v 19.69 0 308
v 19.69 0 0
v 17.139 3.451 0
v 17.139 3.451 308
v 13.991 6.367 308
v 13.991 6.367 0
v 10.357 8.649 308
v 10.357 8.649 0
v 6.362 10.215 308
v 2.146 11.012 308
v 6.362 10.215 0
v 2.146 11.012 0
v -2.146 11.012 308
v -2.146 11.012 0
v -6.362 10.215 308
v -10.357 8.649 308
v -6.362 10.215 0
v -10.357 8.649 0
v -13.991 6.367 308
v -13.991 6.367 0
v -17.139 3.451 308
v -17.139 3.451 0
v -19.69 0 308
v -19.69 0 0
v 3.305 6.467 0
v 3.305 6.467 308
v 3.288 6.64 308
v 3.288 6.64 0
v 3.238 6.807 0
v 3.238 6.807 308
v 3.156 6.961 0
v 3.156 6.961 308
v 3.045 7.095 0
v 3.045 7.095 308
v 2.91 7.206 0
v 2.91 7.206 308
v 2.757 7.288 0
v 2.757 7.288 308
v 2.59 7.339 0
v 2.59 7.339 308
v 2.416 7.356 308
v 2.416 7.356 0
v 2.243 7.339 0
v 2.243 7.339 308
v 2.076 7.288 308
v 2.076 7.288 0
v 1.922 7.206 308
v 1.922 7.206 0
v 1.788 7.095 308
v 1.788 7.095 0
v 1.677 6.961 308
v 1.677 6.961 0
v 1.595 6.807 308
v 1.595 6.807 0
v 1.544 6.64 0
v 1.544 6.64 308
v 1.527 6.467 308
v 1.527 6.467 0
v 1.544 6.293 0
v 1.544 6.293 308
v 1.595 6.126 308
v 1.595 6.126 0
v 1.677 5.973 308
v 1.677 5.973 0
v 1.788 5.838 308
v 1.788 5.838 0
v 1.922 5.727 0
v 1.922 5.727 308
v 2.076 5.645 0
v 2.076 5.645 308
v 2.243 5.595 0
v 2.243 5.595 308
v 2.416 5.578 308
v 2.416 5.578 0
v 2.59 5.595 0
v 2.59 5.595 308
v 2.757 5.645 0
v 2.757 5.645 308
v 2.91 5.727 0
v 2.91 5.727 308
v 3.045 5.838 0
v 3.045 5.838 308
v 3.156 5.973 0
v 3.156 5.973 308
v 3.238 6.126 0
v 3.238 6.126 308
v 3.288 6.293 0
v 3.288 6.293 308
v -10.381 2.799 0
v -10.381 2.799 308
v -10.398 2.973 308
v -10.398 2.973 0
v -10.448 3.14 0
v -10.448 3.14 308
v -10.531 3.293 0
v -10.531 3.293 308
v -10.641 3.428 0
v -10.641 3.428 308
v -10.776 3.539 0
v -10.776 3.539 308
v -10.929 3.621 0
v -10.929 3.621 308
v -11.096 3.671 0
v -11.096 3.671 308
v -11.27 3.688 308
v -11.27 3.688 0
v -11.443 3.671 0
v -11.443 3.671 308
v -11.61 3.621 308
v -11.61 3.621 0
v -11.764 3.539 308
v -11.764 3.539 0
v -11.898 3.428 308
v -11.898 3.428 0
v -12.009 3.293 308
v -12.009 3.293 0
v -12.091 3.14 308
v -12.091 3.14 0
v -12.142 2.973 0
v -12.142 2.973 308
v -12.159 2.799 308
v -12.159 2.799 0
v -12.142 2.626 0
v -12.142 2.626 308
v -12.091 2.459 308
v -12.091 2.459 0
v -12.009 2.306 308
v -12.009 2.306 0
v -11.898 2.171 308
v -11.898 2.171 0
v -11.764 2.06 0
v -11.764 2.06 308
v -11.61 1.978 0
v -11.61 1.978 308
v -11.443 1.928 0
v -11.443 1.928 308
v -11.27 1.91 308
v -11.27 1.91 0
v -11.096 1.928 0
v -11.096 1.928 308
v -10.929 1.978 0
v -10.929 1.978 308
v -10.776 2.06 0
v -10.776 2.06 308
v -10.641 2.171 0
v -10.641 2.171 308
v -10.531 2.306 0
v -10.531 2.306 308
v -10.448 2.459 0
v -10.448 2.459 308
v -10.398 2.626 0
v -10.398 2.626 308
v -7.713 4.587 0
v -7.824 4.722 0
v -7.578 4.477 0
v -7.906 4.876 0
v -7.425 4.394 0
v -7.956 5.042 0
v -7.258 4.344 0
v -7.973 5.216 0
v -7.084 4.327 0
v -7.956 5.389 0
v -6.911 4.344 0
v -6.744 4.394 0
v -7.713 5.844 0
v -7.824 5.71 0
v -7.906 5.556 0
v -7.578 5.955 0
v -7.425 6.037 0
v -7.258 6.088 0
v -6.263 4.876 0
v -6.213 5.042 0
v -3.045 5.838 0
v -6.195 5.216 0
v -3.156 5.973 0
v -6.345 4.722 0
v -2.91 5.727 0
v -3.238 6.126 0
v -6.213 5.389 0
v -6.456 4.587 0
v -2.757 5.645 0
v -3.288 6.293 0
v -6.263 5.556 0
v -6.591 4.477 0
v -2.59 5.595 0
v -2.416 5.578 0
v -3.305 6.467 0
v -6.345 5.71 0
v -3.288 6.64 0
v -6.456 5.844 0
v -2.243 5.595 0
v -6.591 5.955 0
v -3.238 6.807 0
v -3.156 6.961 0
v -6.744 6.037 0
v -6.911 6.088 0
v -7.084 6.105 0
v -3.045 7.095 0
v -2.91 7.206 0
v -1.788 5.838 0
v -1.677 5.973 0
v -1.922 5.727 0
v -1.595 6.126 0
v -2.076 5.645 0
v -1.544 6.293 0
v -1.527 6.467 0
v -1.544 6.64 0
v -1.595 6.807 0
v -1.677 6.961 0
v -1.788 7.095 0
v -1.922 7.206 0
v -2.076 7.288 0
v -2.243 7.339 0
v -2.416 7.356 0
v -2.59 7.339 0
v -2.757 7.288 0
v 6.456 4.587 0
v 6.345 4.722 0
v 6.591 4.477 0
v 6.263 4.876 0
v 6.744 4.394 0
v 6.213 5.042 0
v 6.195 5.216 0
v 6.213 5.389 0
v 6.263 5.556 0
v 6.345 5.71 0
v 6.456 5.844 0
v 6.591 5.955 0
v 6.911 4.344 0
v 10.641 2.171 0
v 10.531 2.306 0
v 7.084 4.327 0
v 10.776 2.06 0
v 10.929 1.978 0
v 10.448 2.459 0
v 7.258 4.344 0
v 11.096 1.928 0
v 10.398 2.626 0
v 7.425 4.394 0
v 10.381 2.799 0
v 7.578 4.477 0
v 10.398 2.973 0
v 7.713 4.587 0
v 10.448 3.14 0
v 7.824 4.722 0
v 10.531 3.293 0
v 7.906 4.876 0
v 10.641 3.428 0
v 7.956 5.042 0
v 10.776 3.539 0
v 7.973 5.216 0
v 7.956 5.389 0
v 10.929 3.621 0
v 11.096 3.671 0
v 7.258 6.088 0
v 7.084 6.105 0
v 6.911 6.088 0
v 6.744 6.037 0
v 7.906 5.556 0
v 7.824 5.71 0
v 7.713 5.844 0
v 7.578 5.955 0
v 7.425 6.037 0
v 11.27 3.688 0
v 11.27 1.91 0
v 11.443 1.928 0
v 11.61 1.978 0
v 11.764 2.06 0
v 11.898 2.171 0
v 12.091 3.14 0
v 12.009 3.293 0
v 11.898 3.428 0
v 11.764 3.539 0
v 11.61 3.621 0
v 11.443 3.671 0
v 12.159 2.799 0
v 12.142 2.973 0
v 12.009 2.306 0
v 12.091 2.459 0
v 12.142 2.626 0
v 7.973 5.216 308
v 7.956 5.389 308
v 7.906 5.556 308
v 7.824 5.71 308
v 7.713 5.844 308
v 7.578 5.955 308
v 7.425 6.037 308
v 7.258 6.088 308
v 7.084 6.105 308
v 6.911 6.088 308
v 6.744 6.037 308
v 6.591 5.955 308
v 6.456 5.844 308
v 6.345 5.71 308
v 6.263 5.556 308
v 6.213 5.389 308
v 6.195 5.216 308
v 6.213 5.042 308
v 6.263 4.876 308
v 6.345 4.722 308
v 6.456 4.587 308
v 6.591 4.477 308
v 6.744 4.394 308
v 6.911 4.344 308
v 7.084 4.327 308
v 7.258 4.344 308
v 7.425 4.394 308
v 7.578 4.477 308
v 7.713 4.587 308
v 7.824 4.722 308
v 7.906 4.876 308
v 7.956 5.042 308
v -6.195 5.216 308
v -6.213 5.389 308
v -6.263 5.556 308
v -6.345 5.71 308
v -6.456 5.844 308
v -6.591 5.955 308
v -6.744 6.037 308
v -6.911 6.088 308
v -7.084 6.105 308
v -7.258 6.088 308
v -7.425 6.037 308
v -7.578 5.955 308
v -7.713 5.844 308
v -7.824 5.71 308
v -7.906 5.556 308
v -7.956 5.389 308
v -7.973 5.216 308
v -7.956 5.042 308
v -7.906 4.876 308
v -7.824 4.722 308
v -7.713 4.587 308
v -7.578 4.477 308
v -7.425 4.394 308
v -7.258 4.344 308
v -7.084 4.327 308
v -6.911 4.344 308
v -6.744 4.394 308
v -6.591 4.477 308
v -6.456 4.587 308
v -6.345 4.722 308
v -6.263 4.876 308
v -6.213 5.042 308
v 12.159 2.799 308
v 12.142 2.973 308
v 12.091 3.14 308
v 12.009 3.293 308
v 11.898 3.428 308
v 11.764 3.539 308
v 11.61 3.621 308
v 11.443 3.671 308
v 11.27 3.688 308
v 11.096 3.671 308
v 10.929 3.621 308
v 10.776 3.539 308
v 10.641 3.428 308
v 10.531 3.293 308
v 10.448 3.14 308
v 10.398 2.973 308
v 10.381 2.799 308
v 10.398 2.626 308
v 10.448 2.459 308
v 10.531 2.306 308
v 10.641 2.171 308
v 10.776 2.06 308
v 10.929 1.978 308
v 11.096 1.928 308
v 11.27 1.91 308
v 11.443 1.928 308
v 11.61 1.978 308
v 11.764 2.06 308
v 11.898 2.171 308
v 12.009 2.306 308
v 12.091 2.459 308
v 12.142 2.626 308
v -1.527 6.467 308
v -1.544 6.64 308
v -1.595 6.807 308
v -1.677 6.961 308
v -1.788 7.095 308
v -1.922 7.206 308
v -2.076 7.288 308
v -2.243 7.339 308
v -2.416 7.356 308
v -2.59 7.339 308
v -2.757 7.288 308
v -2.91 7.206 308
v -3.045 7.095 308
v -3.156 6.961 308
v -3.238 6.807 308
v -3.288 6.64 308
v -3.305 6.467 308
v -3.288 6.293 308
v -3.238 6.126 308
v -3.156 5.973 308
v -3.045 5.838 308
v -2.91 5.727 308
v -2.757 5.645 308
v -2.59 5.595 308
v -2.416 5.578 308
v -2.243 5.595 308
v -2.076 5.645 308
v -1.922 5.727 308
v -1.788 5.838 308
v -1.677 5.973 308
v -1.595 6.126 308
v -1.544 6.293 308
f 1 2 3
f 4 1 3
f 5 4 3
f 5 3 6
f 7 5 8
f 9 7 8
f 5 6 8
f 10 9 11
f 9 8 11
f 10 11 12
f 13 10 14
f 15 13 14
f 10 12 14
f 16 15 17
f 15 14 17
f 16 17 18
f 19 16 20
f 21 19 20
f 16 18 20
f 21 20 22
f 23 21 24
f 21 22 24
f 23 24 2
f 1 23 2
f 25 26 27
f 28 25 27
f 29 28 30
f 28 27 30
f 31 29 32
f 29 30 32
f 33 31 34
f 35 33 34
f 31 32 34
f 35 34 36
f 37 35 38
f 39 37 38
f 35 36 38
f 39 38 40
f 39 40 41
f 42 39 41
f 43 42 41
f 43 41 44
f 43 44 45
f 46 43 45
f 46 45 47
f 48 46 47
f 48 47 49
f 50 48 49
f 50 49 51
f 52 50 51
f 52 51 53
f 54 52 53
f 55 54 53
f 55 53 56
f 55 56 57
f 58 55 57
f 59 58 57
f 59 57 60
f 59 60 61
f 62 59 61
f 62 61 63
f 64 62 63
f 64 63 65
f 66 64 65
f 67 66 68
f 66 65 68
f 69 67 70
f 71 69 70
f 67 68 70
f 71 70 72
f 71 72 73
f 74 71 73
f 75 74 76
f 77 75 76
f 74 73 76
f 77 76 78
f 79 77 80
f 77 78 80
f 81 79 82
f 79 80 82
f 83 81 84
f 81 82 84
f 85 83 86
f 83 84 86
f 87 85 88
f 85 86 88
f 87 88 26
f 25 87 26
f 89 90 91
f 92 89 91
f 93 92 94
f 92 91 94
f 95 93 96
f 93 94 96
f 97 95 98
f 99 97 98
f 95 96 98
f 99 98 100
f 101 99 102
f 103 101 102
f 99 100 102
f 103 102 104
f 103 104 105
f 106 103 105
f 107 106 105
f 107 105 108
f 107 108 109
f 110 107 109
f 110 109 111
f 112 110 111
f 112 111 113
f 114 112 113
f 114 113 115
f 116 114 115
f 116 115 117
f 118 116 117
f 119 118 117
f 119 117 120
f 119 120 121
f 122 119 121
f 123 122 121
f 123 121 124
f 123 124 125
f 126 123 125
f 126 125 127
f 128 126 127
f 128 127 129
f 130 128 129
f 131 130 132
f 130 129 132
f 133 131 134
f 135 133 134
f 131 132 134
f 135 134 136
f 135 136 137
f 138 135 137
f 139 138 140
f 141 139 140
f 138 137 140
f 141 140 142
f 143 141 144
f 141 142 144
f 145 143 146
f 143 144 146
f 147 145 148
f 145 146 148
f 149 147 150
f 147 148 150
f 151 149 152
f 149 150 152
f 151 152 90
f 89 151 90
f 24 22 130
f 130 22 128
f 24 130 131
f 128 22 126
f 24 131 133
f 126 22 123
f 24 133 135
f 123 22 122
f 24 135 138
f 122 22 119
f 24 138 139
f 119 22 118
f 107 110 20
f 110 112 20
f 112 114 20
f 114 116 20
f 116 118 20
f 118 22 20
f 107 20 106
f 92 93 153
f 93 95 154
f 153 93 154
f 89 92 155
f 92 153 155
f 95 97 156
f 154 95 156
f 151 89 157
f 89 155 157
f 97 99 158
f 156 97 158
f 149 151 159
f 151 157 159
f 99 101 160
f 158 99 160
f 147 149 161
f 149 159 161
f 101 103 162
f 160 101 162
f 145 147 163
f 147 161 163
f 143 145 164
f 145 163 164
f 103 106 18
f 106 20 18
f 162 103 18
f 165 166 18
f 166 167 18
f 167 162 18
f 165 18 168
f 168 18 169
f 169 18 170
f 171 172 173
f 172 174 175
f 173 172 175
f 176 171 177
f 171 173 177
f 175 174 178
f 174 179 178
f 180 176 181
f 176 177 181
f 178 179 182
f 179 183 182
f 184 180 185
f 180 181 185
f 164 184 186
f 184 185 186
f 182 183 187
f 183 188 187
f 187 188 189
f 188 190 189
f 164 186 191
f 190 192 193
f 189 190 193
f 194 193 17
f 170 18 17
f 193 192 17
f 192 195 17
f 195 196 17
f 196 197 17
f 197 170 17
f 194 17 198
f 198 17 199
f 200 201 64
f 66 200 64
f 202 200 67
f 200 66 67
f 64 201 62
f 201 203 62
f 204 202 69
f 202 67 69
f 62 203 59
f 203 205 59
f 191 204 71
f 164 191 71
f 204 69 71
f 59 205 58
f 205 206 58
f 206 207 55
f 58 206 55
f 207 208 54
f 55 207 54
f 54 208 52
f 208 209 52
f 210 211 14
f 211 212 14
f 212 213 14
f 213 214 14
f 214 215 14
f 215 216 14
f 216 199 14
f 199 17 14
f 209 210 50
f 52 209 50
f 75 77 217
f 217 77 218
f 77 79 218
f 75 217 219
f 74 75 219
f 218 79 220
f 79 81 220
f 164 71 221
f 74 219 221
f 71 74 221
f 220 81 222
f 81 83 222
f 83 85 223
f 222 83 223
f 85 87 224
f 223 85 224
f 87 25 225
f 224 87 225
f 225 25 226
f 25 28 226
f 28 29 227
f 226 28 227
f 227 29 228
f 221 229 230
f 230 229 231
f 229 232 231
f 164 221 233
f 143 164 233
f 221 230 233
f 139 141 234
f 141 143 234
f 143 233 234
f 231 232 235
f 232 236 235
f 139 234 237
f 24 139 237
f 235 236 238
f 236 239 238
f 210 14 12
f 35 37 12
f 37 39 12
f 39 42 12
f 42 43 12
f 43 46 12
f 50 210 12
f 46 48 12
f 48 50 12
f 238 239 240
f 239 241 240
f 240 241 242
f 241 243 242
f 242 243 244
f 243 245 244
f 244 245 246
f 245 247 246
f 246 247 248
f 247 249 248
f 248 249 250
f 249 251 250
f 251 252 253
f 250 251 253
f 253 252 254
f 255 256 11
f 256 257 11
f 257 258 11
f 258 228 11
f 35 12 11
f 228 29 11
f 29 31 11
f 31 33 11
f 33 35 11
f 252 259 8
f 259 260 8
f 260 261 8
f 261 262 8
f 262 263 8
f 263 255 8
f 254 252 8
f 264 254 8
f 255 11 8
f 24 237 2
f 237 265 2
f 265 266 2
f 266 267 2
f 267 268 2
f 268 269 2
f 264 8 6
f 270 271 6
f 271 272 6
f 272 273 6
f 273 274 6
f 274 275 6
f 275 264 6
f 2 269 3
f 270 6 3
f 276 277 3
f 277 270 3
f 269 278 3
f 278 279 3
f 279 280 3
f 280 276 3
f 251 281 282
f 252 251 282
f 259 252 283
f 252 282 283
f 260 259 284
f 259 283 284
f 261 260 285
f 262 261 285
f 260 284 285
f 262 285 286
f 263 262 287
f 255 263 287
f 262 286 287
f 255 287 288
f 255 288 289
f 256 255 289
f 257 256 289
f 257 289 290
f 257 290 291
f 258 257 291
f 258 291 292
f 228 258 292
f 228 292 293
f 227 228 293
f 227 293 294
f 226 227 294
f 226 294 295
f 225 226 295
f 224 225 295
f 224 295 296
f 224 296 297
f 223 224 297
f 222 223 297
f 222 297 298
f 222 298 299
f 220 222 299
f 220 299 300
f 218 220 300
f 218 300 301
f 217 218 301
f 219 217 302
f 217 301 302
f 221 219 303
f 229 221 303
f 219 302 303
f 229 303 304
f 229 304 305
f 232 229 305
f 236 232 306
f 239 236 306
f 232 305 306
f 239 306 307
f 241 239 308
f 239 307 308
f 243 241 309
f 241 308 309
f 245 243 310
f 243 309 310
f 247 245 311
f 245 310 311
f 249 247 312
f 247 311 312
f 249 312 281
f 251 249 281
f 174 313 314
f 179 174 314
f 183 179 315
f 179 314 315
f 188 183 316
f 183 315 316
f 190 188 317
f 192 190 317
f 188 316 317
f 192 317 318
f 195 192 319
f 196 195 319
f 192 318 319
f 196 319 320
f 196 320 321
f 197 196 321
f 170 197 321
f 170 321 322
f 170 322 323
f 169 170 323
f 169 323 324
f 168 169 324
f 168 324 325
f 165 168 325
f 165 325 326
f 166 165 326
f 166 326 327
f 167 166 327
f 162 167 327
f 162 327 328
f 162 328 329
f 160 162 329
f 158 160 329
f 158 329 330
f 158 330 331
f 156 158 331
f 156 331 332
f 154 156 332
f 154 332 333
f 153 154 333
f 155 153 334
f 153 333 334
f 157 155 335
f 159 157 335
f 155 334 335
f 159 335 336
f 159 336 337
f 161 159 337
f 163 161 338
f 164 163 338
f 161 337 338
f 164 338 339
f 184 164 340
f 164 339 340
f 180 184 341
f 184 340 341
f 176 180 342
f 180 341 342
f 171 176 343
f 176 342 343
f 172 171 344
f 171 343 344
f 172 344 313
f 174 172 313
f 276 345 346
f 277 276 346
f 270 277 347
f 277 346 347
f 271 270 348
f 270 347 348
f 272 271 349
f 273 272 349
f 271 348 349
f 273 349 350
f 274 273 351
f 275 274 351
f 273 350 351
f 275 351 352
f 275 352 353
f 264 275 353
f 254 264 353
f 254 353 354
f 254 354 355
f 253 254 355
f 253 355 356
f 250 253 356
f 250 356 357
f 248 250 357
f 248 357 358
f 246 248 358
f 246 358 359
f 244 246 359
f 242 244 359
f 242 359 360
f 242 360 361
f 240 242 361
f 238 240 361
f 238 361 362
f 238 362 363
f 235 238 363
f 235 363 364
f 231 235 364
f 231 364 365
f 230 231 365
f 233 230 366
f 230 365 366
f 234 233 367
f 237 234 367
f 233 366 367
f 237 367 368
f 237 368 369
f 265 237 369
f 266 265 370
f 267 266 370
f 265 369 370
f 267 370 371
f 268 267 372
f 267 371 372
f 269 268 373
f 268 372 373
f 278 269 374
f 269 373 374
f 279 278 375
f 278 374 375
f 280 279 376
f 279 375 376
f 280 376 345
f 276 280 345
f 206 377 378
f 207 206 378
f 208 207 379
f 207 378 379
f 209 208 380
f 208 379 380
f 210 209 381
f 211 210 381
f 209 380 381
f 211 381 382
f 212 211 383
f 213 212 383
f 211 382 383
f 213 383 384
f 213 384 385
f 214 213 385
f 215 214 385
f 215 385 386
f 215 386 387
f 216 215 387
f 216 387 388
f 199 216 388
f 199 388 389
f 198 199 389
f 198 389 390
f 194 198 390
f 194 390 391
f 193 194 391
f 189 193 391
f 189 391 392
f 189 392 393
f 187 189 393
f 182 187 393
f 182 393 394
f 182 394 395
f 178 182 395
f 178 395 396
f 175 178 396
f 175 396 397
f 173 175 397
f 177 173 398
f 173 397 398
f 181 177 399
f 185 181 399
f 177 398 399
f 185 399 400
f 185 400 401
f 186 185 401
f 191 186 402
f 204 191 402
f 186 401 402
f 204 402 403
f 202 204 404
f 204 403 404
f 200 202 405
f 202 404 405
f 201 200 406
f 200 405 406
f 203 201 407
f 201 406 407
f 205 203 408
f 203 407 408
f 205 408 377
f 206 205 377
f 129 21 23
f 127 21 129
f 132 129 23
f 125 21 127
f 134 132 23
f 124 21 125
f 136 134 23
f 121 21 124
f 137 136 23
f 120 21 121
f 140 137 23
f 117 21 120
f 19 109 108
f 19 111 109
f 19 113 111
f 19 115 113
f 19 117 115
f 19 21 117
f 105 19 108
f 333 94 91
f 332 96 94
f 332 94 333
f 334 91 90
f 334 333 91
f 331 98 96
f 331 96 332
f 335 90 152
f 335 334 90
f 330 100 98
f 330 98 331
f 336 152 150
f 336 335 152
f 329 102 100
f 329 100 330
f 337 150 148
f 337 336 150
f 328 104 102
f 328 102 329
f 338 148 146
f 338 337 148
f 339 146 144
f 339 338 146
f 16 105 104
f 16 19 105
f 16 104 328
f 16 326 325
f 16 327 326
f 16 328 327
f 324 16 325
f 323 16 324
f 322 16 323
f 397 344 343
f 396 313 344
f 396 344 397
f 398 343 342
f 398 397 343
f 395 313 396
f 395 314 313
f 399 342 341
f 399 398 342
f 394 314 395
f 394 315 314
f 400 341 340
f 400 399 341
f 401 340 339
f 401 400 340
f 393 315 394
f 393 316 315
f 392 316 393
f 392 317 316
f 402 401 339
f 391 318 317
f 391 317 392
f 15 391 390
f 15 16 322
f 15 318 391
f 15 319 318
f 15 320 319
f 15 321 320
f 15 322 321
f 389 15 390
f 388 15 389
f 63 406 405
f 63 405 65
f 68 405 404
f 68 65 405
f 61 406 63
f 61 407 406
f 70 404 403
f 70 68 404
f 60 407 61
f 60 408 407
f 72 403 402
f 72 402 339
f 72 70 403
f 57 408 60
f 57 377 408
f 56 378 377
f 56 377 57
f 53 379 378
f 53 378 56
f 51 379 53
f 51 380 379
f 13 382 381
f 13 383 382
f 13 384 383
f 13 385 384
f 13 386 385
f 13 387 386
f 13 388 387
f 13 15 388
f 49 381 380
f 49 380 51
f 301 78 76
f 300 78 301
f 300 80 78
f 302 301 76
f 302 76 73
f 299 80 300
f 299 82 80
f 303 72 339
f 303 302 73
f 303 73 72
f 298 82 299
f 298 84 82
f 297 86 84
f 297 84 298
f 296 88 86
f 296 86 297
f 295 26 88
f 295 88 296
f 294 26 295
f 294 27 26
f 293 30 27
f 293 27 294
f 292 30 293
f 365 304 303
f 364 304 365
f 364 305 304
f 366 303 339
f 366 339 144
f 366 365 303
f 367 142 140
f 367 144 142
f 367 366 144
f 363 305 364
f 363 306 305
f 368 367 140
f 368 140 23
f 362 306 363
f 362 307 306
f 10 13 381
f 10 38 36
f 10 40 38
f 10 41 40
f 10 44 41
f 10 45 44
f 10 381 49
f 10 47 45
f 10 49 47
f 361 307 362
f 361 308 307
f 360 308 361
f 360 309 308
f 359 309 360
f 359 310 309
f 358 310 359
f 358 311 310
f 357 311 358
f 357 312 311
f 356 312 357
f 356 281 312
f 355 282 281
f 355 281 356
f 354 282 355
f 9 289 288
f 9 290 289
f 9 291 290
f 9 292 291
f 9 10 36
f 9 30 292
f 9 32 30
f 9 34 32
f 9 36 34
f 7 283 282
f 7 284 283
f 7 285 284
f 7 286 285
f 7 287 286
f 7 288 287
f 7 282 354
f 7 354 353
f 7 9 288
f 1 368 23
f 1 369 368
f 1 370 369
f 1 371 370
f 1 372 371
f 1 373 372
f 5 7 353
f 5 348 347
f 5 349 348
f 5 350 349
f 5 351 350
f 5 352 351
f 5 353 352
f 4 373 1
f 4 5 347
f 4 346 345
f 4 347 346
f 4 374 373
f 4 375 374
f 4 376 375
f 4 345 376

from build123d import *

# Parameters (mm, degrees)
BOSS_EXTRUDE1_DEPTH = 308.00000001
CUT_EXTRUDE1_REACH  = 310.829
SKETCH2_R           = 0.889


with BuildPart() as part:
    # Sketch1 → Boss-Extrude1 (new body)
    with BuildSketch(Plane.XY):
        with BuildLine():
            Line((-19.689777646, 0), (19.689777646, 0))
            ThreePointArc((19.689777646, 0), (0, 11.1125), (-19.689777646, 0))
        make_face()
    extrude(amount=BOSS_EXTRUDE1_DEPTH)

    # Sketch2 → Cut-Extrude1 (cut, up to next)
    with BuildSketch(Plane.XY.offset(308.00000001), mode=Mode.PRIVATE) as cut_extrude1_sk1:
        with Locations((-11.269696042, 2.799461)):
            Circle(SKETCH2_R)
    cut_extrude1_tool1 = extrude(cut_extrude1_sk1.sketch, amount=-CUT_EXTRUDE1_REACH, mode=Mode.PRIVATE) & part.part
    # Sketch2 → Cut-Extrude1 (cut, up to next)
    with BuildSketch(Plane.XY.offset(308.00000001), mode=Mode.PRIVATE) as cut_extrude1_sk2:
        with Locations((-7.084427042, 5.2158138)):
            Circle(SKETCH2_R)
    cut_extrude1_tool2 = extrude(cut_extrude1_sk2.sketch, amount=-CUT_EXTRUDE1_REACH, mode=Mode.PRIVATE) & part.part
    # Sketch2 → Cut-Extrude1 (cut, up to next)
    with BuildSketch(Plane.XY.offset(308.00000001), mode=Mode.PRIVATE) as cut_extrude1_sk3:
        with Locations((-2.416366133, 6.4666114)):
            Circle(SKETCH2_R)
    cut_extrude1_tool3 = extrude(cut_extrude1_sk3.sketch, amount=-CUT_EXTRUDE1_REACH, mode=Mode.PRIVATE) & part.part
    # Sketch2 → Cut-Extrude1 (cut, up to next)
    with BuildSketch(Plane.XY.offset(308.00000001), mode=Mode.PRIVATE) as cut_extrude1_sk4:
        with Locations((2.416366133, 6.4666114)):
            Circle(SKETCH2_R)
    cut_extrude1_tool4 = extrude(cut_extrude1_sk4.sketch, amount=-CUT_EXTRUDE1_REACH, mode=Mode.PRIVATE) & part.part
    # Sketch2 → Cut-Extrude1 (cut, up to next)
    with BuildSketch(Plane.XY.offset(308.00000001), mode=Mode.PRIVATE) as cut_extrude1_sk5:
        with Locations((7.084427042, 5.2158138)):
            Circle(SKETCH2_R)
    cut_extrude1_tool5 = extrude(cut_extrude1_sk5.sketch, amount=-CUT_EXTRUDE1_REACH, mode=Mode.PRIVATE) & part.part
    # Sketch2 → Cut-Extrude1 (cut, up to next)
    with BuildSketch(Plane.XY.offset(308.00000001), mode=Mode.PRIVATE) as cut_extrude1_sk6:
        with Locations((11.269695955, 2.799461)):
            Circle(SKETCH2_R)
    cut_extrude1_tool6 = extrude(cut_extrude1_sk6.sketch, amount=-CUT_EXTRUDE1_REACH, mode=Mode.PRIVATE) & part.part
    add(cut_extrude1_tool1.solids().sort_by_distance((-11.269696, 2.799461, 308))[0], mode=Mode.SUBTRACT)
    add(cut_extrude1_tool2.solids().sort_by_distance((-7.084427, 5.215814, 308))[0], mode=Mode.SUBTRACT)
    add(cut_extrude1_tool3.solids().sort_by_distance((-2.416366, 6.466611, 308))[0], mode=Mode.SUBTRACT)
    add(cut_extrude1_tool4.solids().sort_by_distance((2.416366, 6.466611, 308))[0], mode=Mode.SUBTRACT)
    add(cut_extrude1_tool5.solids().sort_by_distance((7.084427, 5.215814, 308))[0], mode=Mode.SUBTRACT)
    add(cut_extrude1_tool6.solids().sort_by_distance((11.269696, 2.799461, 308))[0], mode=Mode.SUBTRACT)


solid = part.part
